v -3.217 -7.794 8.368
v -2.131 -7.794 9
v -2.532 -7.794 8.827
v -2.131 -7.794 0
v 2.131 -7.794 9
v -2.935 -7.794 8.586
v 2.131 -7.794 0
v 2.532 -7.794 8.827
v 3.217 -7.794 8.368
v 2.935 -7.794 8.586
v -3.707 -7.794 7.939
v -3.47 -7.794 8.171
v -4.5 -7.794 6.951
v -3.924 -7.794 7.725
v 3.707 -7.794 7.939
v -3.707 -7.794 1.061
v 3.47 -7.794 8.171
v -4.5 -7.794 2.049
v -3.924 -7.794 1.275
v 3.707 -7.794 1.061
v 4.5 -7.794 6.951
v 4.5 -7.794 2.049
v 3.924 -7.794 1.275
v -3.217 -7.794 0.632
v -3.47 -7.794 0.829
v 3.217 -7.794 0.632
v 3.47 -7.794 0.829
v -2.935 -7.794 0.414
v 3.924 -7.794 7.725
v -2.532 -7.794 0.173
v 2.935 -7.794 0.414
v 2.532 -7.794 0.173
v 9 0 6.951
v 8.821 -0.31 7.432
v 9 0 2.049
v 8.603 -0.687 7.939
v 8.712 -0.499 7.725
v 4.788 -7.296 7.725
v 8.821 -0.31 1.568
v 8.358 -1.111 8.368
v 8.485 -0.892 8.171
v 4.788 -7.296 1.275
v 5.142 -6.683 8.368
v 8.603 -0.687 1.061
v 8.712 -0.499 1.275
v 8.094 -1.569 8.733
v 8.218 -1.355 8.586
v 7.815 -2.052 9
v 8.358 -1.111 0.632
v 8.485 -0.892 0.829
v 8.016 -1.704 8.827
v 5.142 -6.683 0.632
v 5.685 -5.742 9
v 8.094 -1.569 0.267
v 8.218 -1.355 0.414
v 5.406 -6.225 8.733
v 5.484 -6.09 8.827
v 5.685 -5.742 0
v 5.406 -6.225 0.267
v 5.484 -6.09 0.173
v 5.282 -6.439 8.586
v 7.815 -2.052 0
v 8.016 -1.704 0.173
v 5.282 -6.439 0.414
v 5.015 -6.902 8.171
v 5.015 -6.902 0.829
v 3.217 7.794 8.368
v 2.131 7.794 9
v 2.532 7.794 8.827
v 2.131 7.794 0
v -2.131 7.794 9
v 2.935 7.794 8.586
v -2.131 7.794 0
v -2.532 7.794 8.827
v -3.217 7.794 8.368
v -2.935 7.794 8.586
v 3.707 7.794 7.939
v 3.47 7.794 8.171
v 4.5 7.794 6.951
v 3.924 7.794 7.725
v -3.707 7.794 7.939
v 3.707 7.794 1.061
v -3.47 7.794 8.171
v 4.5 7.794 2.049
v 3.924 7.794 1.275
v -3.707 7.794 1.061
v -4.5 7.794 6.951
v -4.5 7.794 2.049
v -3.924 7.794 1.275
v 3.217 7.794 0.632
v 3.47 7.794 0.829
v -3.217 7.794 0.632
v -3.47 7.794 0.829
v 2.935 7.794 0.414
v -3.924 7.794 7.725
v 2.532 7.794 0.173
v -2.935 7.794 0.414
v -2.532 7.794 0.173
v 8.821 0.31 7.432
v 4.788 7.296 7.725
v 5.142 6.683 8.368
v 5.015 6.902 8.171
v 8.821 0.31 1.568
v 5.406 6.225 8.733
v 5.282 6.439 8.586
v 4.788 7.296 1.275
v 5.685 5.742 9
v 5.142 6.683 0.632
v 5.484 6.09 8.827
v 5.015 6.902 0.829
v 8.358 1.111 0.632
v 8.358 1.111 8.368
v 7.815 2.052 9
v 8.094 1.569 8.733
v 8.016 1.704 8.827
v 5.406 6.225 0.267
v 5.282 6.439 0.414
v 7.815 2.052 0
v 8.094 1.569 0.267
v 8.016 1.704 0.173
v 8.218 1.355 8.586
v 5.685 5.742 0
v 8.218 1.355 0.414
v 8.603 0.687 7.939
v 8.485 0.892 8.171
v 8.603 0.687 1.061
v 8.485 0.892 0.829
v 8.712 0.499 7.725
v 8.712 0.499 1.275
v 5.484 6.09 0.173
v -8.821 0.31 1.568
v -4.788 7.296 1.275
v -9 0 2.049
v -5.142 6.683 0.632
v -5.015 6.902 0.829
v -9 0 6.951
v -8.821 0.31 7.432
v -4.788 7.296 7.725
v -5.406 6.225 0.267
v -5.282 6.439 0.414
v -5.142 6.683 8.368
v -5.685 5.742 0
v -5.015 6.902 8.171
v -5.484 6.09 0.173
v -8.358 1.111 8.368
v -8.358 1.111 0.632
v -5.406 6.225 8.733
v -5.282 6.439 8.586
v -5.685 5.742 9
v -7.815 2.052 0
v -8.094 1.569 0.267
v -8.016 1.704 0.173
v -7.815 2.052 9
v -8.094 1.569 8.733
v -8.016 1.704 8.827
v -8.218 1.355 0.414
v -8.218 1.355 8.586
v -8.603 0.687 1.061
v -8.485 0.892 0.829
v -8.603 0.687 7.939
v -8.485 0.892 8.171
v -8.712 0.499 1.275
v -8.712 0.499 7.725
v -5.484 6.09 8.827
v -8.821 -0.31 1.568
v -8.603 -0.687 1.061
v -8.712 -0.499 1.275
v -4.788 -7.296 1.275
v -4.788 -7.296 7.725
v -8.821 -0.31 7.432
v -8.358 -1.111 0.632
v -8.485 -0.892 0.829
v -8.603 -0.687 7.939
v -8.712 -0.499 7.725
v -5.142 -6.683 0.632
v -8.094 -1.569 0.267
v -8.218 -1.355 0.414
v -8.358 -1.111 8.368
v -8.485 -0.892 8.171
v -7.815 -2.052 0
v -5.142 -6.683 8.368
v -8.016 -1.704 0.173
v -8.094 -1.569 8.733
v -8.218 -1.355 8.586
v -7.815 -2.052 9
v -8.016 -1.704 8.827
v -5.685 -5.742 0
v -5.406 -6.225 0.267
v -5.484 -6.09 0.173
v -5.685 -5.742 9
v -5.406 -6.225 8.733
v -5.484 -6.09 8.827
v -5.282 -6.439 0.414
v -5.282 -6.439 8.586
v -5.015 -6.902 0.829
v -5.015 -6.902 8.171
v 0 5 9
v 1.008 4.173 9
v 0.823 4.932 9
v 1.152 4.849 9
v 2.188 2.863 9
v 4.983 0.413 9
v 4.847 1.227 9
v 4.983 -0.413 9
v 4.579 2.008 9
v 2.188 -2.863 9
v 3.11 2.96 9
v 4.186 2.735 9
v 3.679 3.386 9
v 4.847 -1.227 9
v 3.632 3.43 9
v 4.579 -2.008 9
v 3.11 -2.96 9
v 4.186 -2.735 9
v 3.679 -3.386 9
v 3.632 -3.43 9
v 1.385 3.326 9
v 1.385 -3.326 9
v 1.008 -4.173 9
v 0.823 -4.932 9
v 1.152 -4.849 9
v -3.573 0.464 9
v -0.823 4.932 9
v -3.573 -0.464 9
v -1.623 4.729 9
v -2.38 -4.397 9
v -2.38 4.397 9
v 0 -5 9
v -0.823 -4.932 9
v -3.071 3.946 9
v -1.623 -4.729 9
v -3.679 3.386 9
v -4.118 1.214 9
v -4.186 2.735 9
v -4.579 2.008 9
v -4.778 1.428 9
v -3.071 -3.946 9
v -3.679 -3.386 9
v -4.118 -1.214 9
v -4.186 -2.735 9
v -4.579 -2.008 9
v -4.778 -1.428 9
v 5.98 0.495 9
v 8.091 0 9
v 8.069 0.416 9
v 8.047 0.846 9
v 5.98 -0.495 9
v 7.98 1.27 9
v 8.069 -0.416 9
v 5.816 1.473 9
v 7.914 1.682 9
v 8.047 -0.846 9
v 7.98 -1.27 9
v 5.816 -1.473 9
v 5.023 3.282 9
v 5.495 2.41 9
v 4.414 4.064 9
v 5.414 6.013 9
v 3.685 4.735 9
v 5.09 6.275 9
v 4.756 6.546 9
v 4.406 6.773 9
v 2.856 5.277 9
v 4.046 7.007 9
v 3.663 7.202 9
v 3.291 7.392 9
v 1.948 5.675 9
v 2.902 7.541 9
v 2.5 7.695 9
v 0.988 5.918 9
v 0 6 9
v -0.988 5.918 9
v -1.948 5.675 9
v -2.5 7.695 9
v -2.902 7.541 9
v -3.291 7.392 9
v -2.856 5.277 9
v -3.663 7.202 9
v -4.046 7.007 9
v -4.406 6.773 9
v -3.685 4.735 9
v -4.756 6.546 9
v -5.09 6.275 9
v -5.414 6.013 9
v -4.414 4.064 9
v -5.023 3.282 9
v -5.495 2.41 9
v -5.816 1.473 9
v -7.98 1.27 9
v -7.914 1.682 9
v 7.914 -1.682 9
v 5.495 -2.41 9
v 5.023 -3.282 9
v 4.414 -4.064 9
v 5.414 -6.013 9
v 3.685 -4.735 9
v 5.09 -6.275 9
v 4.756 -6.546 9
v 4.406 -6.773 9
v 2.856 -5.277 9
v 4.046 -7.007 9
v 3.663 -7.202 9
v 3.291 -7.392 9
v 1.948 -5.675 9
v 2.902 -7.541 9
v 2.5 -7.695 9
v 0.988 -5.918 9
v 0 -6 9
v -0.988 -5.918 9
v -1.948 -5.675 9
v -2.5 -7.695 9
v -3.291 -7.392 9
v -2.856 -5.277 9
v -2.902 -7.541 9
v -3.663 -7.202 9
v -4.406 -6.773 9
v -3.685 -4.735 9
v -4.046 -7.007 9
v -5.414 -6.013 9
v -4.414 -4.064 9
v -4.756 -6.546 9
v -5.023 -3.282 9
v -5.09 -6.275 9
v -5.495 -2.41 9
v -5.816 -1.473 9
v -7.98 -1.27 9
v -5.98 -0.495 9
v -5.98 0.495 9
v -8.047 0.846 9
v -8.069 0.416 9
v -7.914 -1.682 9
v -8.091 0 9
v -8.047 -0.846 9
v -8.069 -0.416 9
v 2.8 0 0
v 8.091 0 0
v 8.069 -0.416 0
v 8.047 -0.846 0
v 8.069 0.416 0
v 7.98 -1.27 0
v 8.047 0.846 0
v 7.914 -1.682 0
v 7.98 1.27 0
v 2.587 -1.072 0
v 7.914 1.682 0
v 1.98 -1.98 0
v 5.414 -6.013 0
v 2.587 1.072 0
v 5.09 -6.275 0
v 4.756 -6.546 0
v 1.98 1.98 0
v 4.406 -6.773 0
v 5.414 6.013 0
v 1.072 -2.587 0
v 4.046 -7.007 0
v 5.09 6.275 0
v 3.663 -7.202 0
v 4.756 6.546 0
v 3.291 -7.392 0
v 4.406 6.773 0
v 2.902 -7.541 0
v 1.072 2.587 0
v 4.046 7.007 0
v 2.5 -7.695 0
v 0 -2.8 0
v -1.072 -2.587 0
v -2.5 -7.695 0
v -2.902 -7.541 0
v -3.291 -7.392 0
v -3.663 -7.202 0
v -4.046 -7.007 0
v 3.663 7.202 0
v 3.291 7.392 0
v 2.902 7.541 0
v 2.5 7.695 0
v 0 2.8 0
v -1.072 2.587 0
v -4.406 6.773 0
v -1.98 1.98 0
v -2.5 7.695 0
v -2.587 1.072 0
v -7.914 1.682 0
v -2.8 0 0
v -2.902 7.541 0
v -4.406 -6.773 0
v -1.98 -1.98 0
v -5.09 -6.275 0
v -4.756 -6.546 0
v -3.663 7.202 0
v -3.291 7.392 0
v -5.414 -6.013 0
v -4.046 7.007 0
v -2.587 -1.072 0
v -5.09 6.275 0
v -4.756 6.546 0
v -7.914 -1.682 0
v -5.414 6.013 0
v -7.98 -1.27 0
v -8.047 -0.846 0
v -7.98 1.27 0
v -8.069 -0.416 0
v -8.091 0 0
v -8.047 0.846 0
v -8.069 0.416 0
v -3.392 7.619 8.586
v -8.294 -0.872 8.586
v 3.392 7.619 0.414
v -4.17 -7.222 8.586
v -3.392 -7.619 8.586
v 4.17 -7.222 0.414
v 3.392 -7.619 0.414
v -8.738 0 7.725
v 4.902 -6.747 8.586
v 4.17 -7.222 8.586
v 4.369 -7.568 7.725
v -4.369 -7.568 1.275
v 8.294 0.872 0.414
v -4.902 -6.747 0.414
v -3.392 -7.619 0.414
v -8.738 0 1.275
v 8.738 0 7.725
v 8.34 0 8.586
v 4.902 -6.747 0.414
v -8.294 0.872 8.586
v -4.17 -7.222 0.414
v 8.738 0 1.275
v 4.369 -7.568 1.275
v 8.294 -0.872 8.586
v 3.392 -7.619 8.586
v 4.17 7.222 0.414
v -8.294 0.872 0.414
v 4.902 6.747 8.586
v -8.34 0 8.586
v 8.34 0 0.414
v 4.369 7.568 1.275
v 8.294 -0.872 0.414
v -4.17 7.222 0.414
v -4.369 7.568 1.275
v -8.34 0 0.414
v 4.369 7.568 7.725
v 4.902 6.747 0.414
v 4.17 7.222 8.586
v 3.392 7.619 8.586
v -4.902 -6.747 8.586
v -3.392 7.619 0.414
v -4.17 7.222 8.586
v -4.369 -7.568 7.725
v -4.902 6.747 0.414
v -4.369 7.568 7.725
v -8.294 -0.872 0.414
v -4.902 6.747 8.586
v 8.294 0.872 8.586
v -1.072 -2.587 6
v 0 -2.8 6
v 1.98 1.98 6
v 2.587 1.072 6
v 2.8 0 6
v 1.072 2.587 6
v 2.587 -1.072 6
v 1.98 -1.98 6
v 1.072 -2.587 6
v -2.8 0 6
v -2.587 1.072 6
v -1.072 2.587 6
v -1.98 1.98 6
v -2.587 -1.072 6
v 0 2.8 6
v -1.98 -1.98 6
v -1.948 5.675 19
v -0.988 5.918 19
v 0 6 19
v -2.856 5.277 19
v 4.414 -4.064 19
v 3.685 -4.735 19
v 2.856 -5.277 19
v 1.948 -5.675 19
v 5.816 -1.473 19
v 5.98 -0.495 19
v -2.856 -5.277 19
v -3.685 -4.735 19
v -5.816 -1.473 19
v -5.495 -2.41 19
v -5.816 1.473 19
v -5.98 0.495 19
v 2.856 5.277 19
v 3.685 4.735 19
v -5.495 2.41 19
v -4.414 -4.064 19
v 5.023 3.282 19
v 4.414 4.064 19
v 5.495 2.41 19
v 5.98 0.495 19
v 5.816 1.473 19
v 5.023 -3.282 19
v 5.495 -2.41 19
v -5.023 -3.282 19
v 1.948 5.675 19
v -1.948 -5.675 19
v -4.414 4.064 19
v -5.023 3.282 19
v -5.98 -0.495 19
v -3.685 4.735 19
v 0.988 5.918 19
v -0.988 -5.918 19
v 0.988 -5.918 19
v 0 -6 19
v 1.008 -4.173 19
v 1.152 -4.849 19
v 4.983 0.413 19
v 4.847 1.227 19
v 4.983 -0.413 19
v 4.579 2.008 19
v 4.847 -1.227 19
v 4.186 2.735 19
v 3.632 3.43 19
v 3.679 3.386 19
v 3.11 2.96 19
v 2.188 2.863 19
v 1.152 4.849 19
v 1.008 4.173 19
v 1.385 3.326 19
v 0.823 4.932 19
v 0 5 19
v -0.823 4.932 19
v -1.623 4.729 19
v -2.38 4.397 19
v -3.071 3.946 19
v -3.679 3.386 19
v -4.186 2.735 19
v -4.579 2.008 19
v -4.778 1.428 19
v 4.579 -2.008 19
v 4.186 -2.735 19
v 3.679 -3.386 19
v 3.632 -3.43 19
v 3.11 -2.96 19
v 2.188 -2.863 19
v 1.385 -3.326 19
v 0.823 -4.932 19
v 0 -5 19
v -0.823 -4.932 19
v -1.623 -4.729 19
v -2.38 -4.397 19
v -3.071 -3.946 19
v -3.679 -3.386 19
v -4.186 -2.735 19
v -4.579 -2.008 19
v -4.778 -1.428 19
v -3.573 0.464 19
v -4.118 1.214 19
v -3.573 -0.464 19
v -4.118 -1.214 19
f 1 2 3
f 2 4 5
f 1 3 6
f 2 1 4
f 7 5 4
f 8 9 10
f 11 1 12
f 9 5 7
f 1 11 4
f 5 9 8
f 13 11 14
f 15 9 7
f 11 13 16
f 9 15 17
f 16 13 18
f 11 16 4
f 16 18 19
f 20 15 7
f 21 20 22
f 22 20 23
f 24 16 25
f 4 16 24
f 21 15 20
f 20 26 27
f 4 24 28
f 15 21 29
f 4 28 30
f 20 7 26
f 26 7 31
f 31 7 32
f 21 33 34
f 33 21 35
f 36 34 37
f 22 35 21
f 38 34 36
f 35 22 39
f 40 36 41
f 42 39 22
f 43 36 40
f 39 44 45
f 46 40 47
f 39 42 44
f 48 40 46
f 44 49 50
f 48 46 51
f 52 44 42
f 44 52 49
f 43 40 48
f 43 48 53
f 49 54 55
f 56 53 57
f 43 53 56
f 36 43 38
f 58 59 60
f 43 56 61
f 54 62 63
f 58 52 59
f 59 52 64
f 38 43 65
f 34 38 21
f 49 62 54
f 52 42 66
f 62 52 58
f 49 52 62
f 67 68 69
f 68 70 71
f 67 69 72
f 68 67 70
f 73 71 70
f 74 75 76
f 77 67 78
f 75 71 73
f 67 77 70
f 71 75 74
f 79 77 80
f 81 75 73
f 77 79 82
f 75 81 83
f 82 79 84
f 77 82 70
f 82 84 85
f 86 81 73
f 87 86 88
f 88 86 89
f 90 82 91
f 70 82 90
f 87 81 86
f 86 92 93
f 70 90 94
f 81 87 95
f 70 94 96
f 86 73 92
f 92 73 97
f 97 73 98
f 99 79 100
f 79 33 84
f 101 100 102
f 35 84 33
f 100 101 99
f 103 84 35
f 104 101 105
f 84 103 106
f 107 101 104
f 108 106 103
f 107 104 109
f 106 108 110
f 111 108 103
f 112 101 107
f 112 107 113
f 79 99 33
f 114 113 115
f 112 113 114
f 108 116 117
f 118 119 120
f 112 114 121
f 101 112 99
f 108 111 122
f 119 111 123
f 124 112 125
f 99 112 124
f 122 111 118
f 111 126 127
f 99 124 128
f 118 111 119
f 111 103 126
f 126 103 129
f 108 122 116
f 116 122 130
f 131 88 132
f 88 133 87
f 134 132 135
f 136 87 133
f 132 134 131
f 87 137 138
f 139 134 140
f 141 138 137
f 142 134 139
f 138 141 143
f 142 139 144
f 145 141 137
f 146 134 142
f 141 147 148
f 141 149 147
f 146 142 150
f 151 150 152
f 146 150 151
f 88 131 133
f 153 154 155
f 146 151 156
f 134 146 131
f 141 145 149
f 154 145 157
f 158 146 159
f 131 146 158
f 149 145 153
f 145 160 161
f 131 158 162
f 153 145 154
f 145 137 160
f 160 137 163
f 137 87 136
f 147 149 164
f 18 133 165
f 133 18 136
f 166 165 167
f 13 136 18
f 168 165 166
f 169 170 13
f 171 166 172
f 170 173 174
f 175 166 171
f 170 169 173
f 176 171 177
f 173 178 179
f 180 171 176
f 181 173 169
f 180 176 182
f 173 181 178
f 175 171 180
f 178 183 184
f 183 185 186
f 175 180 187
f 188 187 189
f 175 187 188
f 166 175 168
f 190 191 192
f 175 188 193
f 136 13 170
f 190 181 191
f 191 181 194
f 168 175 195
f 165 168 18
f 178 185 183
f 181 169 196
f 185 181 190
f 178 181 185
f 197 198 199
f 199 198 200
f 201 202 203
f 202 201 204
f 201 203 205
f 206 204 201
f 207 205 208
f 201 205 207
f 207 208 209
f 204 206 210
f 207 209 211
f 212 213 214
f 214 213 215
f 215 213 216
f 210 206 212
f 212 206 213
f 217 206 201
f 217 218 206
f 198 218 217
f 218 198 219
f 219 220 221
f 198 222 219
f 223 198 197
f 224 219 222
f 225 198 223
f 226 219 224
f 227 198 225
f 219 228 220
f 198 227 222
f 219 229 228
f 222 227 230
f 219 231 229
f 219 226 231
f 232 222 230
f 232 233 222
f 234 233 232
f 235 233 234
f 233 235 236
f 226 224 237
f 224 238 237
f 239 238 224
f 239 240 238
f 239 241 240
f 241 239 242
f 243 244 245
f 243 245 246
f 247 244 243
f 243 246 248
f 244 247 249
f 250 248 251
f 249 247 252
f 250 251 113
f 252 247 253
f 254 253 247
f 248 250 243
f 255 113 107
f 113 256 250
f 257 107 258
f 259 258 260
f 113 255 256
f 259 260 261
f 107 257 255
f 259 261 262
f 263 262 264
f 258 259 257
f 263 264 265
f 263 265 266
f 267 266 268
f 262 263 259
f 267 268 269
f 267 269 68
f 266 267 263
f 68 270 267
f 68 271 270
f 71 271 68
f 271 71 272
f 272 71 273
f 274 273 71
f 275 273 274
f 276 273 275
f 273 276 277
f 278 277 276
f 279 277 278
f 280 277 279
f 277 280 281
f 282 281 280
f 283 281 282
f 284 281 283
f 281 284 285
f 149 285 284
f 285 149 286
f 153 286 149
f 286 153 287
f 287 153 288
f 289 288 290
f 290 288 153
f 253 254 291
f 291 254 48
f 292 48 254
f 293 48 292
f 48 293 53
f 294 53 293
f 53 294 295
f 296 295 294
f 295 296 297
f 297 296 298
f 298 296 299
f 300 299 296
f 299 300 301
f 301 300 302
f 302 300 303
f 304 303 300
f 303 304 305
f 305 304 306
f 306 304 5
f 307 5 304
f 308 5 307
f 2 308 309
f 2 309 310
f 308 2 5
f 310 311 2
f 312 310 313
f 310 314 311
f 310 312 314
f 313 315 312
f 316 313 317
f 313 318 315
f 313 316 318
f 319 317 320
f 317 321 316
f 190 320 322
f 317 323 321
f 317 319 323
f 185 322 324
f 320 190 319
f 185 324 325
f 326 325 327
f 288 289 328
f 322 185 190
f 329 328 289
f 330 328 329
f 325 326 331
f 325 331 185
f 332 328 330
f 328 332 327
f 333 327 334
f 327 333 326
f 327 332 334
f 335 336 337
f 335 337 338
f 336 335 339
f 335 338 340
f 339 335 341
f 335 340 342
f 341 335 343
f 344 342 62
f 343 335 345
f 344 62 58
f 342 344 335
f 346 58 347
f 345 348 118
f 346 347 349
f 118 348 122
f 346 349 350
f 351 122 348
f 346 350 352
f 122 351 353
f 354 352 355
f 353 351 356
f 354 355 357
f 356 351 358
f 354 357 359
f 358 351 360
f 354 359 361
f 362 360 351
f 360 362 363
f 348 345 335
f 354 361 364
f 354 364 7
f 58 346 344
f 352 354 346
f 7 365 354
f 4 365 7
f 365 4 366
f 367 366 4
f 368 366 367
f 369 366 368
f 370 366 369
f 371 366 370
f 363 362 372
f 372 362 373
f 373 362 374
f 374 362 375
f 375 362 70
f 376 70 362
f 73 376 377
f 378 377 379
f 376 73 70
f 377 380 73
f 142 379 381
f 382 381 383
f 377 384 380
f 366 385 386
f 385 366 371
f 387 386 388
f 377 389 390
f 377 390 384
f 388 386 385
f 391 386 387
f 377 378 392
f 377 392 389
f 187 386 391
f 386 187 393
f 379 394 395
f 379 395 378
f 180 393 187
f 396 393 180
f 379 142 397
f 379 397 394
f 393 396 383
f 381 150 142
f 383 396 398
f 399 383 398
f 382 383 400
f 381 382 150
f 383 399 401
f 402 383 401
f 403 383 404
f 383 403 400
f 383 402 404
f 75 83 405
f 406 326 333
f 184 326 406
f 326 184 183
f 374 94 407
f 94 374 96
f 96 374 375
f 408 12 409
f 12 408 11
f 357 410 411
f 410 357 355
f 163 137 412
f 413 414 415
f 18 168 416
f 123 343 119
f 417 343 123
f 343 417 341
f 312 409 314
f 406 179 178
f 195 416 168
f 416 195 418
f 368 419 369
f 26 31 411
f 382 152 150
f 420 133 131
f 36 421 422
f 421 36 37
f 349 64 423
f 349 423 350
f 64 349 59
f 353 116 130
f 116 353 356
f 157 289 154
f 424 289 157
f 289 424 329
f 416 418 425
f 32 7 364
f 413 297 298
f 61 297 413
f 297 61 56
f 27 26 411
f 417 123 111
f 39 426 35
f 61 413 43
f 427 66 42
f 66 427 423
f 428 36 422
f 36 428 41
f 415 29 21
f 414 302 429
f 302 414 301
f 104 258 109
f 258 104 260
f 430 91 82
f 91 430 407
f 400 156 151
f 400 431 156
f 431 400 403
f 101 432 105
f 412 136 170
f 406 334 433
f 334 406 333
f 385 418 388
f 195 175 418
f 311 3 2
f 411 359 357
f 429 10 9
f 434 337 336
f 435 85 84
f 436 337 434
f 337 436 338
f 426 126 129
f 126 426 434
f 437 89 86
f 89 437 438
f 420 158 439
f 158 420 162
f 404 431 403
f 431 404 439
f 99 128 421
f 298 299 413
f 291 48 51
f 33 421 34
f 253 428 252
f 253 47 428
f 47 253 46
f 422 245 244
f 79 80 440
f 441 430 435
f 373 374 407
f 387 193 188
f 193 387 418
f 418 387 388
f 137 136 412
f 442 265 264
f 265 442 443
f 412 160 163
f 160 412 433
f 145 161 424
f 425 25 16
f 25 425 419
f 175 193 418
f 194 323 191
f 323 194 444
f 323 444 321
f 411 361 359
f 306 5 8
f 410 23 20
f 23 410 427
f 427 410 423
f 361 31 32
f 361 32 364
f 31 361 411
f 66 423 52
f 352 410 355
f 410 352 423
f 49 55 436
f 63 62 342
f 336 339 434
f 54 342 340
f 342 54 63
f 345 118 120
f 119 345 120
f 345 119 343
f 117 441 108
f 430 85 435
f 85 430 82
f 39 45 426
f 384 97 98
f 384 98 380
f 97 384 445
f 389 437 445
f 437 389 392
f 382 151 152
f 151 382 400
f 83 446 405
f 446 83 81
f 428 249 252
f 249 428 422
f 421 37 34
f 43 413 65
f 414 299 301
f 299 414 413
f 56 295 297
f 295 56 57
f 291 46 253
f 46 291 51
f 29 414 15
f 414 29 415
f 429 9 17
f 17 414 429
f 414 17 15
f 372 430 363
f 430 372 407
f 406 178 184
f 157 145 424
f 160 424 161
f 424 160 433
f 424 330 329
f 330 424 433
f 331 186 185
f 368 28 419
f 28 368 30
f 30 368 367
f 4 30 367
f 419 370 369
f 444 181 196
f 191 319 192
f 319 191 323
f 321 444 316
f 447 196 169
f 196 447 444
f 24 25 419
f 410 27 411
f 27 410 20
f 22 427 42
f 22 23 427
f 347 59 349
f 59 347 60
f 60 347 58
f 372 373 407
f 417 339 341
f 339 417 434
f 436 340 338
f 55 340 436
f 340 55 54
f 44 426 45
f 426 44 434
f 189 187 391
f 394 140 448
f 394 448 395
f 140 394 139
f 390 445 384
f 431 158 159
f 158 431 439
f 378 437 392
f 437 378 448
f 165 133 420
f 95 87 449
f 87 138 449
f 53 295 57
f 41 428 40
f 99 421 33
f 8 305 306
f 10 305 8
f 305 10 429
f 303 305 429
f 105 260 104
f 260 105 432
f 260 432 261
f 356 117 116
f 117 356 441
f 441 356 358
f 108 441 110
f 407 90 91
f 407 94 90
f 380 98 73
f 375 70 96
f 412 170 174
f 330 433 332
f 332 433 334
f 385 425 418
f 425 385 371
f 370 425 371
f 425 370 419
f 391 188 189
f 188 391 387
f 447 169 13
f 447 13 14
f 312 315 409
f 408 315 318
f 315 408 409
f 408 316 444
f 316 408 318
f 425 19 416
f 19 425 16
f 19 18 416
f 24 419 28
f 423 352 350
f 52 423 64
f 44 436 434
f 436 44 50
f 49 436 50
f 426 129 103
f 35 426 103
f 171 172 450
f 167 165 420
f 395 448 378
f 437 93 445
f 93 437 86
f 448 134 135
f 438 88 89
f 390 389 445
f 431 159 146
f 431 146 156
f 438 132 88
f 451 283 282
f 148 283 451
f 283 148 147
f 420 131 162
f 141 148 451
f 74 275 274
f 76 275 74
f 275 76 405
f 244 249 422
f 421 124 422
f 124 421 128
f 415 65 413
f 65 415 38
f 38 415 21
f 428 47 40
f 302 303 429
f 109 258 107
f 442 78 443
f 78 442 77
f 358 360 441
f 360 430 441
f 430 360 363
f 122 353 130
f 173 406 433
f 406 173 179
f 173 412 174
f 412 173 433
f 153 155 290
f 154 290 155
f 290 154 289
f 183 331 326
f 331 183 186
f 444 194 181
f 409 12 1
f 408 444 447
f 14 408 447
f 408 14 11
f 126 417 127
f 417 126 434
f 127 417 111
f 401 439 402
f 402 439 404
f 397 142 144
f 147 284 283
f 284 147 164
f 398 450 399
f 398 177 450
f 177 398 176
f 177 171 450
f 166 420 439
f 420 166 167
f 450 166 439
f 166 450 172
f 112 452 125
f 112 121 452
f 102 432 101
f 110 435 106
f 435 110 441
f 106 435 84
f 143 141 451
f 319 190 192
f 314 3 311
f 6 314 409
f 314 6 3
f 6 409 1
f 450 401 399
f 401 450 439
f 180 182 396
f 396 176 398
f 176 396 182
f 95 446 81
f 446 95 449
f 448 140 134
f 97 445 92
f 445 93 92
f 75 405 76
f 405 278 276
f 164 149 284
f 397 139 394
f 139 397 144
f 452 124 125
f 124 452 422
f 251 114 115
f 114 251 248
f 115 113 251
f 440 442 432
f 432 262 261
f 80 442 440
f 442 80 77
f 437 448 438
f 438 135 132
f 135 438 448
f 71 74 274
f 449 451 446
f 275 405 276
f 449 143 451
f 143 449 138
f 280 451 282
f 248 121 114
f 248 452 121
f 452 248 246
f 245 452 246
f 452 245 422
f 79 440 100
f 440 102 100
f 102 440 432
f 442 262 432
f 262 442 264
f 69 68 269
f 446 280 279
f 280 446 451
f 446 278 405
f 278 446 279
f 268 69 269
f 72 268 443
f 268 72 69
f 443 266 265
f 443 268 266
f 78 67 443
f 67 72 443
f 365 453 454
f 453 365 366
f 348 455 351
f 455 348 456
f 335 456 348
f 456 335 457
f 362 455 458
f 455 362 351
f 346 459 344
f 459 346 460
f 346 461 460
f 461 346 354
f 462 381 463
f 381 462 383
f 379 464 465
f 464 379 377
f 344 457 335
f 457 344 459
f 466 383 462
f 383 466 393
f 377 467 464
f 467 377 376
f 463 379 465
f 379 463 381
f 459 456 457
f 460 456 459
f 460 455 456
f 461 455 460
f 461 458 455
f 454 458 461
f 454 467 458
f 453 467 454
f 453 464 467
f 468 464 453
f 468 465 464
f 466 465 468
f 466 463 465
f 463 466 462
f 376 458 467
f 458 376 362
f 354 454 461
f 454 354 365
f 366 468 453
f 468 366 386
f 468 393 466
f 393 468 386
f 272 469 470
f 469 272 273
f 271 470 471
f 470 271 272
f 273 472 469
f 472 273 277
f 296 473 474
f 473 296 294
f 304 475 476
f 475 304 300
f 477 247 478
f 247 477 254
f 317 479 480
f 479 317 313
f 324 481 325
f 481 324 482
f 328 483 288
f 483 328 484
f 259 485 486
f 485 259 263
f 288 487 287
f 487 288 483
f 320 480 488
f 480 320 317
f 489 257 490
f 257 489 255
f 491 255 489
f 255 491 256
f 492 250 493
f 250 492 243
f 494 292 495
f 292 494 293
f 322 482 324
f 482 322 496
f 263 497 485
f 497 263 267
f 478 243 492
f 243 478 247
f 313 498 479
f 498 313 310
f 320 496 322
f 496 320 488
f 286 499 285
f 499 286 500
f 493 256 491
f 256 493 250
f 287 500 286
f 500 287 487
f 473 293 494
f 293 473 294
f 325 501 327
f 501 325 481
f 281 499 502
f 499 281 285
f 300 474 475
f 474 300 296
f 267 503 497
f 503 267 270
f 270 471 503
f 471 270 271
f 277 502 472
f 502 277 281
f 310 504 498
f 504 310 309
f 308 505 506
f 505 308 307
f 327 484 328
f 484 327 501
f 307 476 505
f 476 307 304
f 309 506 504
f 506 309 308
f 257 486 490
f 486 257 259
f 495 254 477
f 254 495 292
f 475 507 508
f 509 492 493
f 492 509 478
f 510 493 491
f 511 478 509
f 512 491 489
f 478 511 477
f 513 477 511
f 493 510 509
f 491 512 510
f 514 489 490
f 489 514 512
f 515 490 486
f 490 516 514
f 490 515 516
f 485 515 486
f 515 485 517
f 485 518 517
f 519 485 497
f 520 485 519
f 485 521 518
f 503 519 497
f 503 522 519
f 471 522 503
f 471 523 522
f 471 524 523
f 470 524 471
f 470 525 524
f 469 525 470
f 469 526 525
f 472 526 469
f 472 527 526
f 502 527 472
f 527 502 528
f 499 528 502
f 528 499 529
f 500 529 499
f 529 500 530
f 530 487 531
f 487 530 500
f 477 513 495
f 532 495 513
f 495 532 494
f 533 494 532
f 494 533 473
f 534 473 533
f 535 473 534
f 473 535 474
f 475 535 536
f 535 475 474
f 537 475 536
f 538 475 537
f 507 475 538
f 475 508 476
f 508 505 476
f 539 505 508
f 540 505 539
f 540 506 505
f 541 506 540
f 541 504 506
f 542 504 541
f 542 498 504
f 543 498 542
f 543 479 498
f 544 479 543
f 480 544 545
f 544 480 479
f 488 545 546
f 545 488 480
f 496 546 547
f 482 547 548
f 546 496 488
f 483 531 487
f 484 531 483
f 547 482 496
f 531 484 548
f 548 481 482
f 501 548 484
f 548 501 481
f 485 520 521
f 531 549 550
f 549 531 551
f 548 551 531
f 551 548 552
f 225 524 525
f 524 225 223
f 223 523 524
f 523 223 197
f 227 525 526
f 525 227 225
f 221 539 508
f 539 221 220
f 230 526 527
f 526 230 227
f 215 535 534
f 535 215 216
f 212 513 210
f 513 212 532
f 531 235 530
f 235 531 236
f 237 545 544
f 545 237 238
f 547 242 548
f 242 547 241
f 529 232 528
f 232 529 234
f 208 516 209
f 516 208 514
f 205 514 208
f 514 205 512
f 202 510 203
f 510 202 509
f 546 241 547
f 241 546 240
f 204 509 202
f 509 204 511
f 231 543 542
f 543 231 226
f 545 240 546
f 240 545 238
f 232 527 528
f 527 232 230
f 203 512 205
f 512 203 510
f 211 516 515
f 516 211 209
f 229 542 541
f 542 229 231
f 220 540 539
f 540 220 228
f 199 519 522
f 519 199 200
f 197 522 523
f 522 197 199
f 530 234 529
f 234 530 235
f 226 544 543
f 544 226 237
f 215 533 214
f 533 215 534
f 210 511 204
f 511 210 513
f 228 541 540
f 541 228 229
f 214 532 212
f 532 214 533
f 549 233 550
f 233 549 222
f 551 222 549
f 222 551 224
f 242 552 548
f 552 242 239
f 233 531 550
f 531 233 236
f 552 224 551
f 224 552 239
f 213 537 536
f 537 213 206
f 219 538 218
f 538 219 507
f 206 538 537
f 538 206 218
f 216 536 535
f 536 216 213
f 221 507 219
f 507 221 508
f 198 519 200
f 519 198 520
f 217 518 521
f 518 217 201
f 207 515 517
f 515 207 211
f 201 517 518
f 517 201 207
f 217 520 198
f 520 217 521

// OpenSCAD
// file: ../../connectors/notched_circle/constants.scad
connectors_notched_circle_thickness = 2;
connectors_notched_circle_notch_diameter = 3;
connectors_notched_circle_loose_length = 1;
connectors_notched_circle_loose_to_tight_length = 1;
// file: ../feed/measurements.scad
hero_dualie_feed_connector_depth = 5;
hero_dualie_feed_diameter = 5;
hero_dualie_feed_x = 59;
hero_dualie_feed_y = 45;
hero_dualie_feed_angle = 20;
// file: ../../connectors/notched_circle/male.scad
include <../../settings.scad>;
use <../../utilities/cylinders.scad>;
include <constants.scad>;

// Renders the male counterpart of a circular connector with an orienting notch.
// Place on the surface oriented so that Z+ is the surface normal.
module connectors_notched_circle_male(
    // The outer diameter of the male circle.
    diameter,
    // The length of the male circle.
    length,
    // The number of notches, spaced evenly.
    notches
) {
  union() {
    difference() {
      cylinder(
        d = diameter,
        h = length,
        $fn = cylinder_sides(diameter)
      );
      cylinder(
        d = diameter - connectors_notched_circle_thickness,
        h = length + 0.001,
        $fn = cylinder_sides(diameter)
      );
    };
    intersection() {
      for (notch = [0:notches - 1]) {
        rotate([0, 0, notch * 360 / notches]) {
          translate([
            0,
            diameter / 2 - connectors_notched_circle_thickness / 2,
            0
          ]) {
            cylinder(
              d = connectors_notched_circle_notch_diameter,
              h = length,
              $fn = cylinder_sides(connectors_notched_circle_notch_diameter)
            );
          };
        };
      };
      cylinder(
        d = diameter,
        h = length,
        $fn = cylinder_sides(diameter)
      );
    };
  };
};
// file: ../../components/nut.scad
use <../utilities/cylinders.scad>

// Generates a nut exterior along Z+, including rounded vertices.
module components_nut(
  // The diameter of the nut, measures between opposing vertices.
  vertex_diameter,
  // The length of the nut along Z+.
  length,
  // The number of sides on the nut.
  sides,
  // The radiusing to apply horizontally.
  horizontal_radiusing,
  // The radiusing to apply vertically.
  vertical_radiusing
) {
  intersection() {
    cylinder(
      d = vertex_diameter,
      h = length,
      $fn = sides
    );
    translate([0, 0, length / 2]) {
      scale([
        vertex_diameter * horizontal_radiusing,
        vertex_diameter * horizontal_radiusing,
        length * vertical_radiusing
      ]) {
        sphere(1, $fn = cylinder_sides(norm([vertex_diameter, length]) * 2));
      };
    };
  };
};
// file: ../../utilities/cylinders.scad
// Calculates the $fn which should be used for a cylinder of a specific size.
function cylinder_sides(
  // The diameter of the cylinder.
  diameter
) = ceil(
  max(
    min(
      360 / $fa,
      diameter * PI / $fs
    ),
    8
  )
);

// Generates a grid of square perforations through a cylinder of a specific
// size.
module cylinder_perforations(
  // The diameter of the cylinder.
  diameter,
  // The height of the cylinder.
  length,
  // The size (width/height) of each perforation.
  perforation_size,
  // The target spacing between perforations.  This will be adjusted to fit
  // evenly on the cylinder.
  perforation_spacing
) {
  half_perimeter = diameter * PI / 2;
  angularPerforations = round(half_perimeter / perforation_spacing);
  zPerforations = round(length / perforation_spacing);
  for (angle = [0:180 / angularPerforations:180]) {
    rotate([0, 0, angle]) {
      for (z = [(length / zPerforations) * 0.5:length / zPerforations:length - (length / zPerforations) * 0.5]) {
        translate([0, 0, z]) {
          cube([diameter, perforation_size, perforation_size], center = true);
        };
      }
    };
  };
};

// Generates a "pipe" which lofts a sequence of circles together.
module cylinder_sequence(
  // The diameter of the first circle.
  initial_diameter,
  // An array of arrays, where each child array is two numbers:
  // - The length of the segment along Z.
  // - The diameter of the end of the segment.
  length_diameter_pairs,
  // The number of sides of all circles drawn.
  sides,
  // Used for recursion; leave as default.
  i = 0
) {
  if (i < len(length_diameter_pairs)) {
    cylinder(
      d1 = initial_diameter,
      d2 = length_diameter_pairs[i][1],
      h = length_diameter_pairs[i][0],
      $fn = sides
    );
    translate([
      0,
      0,
      length_diameter_pairs[i][0]
    ]) {
      cylinder_sequence(
        length_diameter_pairs[i][1],
        length_diameter_pairs,
        sides,
        i + 1
      );
    };
  };
};
// file: nut.scad
include <../../settings.scad>;
use <../../utilities/cylinders.scad>;
use <../../components/nut.scad>;
use <../../connectors/notched_circle/male.scad>;
include <measurements.scad>;
include <../feed/measurements.scad>;

module hero_dualie_tube_nut() {
  difference() {
    components_nut(
      hero_dualie_tube_nut_diameter,
      hero_dualie_tube_nut_length,
      hero_dualie_tube_nut_sides,
      hero_dualie_tube_nut_horizontal_radiusing,
      hero_dualie_tube_nut_vertical_radiusing
    );

    // The connector to the feed.
    cylinder(
      d = hero_dualie_feed_diameter + tight_tolerance,
      h = hero_dualie_feed_connector_depth + loose_tolerance,
      $fn = cylinder_sides(hero_dualie_feed_diameter)
    );
  };

  // The connector to the tube.
  translate([
    0,
    0,
    hero_dualie_tube_nut_length
  ]) {
    rotate([0, 0, 90]) {
      connectors_notched_circle_male(
        hero_dualie_tube_nut_connector_diameter,
        hero_dualie_tube_nut_connector_length,
        hero_dualie_tube_nut_connector_notches
      );
    };
  };
};
// file: measurements.scad
hero_dualie_tube_nut_length = 9;
hero_dualie_tube_nut_diameter = 18;
hero_dualie_tube_nut_sides = 6;
hero_dualie_tube_nut_horizontal_radiusing = 0.52;
hero_dualie_tube_nut_vertical_radiusing = 1;

hero_dualie_tube_nut_connector_diameter = 12;
hero_dualie_tube_nut_connector_length = 10;
hero_dualie_tube_nut_connector_notches = 3;
// file: ../../settings.scad
// When true, lower resolution primitives will be used.
draft = false;

$fs = draft ? 2 : 1;
$fa = draft ? 12 : 6;

// The amount of space left between parts which must fit together tightly.
tight_tolerance = 0.6;

// The amount of space left between parts which must fit together loosely.
loose_tolerance = 1;
// main file
include <../../settings.scad>;
include <measurements.scad>;
use <nut.scad>;

hero_dualie_tube_nut();
